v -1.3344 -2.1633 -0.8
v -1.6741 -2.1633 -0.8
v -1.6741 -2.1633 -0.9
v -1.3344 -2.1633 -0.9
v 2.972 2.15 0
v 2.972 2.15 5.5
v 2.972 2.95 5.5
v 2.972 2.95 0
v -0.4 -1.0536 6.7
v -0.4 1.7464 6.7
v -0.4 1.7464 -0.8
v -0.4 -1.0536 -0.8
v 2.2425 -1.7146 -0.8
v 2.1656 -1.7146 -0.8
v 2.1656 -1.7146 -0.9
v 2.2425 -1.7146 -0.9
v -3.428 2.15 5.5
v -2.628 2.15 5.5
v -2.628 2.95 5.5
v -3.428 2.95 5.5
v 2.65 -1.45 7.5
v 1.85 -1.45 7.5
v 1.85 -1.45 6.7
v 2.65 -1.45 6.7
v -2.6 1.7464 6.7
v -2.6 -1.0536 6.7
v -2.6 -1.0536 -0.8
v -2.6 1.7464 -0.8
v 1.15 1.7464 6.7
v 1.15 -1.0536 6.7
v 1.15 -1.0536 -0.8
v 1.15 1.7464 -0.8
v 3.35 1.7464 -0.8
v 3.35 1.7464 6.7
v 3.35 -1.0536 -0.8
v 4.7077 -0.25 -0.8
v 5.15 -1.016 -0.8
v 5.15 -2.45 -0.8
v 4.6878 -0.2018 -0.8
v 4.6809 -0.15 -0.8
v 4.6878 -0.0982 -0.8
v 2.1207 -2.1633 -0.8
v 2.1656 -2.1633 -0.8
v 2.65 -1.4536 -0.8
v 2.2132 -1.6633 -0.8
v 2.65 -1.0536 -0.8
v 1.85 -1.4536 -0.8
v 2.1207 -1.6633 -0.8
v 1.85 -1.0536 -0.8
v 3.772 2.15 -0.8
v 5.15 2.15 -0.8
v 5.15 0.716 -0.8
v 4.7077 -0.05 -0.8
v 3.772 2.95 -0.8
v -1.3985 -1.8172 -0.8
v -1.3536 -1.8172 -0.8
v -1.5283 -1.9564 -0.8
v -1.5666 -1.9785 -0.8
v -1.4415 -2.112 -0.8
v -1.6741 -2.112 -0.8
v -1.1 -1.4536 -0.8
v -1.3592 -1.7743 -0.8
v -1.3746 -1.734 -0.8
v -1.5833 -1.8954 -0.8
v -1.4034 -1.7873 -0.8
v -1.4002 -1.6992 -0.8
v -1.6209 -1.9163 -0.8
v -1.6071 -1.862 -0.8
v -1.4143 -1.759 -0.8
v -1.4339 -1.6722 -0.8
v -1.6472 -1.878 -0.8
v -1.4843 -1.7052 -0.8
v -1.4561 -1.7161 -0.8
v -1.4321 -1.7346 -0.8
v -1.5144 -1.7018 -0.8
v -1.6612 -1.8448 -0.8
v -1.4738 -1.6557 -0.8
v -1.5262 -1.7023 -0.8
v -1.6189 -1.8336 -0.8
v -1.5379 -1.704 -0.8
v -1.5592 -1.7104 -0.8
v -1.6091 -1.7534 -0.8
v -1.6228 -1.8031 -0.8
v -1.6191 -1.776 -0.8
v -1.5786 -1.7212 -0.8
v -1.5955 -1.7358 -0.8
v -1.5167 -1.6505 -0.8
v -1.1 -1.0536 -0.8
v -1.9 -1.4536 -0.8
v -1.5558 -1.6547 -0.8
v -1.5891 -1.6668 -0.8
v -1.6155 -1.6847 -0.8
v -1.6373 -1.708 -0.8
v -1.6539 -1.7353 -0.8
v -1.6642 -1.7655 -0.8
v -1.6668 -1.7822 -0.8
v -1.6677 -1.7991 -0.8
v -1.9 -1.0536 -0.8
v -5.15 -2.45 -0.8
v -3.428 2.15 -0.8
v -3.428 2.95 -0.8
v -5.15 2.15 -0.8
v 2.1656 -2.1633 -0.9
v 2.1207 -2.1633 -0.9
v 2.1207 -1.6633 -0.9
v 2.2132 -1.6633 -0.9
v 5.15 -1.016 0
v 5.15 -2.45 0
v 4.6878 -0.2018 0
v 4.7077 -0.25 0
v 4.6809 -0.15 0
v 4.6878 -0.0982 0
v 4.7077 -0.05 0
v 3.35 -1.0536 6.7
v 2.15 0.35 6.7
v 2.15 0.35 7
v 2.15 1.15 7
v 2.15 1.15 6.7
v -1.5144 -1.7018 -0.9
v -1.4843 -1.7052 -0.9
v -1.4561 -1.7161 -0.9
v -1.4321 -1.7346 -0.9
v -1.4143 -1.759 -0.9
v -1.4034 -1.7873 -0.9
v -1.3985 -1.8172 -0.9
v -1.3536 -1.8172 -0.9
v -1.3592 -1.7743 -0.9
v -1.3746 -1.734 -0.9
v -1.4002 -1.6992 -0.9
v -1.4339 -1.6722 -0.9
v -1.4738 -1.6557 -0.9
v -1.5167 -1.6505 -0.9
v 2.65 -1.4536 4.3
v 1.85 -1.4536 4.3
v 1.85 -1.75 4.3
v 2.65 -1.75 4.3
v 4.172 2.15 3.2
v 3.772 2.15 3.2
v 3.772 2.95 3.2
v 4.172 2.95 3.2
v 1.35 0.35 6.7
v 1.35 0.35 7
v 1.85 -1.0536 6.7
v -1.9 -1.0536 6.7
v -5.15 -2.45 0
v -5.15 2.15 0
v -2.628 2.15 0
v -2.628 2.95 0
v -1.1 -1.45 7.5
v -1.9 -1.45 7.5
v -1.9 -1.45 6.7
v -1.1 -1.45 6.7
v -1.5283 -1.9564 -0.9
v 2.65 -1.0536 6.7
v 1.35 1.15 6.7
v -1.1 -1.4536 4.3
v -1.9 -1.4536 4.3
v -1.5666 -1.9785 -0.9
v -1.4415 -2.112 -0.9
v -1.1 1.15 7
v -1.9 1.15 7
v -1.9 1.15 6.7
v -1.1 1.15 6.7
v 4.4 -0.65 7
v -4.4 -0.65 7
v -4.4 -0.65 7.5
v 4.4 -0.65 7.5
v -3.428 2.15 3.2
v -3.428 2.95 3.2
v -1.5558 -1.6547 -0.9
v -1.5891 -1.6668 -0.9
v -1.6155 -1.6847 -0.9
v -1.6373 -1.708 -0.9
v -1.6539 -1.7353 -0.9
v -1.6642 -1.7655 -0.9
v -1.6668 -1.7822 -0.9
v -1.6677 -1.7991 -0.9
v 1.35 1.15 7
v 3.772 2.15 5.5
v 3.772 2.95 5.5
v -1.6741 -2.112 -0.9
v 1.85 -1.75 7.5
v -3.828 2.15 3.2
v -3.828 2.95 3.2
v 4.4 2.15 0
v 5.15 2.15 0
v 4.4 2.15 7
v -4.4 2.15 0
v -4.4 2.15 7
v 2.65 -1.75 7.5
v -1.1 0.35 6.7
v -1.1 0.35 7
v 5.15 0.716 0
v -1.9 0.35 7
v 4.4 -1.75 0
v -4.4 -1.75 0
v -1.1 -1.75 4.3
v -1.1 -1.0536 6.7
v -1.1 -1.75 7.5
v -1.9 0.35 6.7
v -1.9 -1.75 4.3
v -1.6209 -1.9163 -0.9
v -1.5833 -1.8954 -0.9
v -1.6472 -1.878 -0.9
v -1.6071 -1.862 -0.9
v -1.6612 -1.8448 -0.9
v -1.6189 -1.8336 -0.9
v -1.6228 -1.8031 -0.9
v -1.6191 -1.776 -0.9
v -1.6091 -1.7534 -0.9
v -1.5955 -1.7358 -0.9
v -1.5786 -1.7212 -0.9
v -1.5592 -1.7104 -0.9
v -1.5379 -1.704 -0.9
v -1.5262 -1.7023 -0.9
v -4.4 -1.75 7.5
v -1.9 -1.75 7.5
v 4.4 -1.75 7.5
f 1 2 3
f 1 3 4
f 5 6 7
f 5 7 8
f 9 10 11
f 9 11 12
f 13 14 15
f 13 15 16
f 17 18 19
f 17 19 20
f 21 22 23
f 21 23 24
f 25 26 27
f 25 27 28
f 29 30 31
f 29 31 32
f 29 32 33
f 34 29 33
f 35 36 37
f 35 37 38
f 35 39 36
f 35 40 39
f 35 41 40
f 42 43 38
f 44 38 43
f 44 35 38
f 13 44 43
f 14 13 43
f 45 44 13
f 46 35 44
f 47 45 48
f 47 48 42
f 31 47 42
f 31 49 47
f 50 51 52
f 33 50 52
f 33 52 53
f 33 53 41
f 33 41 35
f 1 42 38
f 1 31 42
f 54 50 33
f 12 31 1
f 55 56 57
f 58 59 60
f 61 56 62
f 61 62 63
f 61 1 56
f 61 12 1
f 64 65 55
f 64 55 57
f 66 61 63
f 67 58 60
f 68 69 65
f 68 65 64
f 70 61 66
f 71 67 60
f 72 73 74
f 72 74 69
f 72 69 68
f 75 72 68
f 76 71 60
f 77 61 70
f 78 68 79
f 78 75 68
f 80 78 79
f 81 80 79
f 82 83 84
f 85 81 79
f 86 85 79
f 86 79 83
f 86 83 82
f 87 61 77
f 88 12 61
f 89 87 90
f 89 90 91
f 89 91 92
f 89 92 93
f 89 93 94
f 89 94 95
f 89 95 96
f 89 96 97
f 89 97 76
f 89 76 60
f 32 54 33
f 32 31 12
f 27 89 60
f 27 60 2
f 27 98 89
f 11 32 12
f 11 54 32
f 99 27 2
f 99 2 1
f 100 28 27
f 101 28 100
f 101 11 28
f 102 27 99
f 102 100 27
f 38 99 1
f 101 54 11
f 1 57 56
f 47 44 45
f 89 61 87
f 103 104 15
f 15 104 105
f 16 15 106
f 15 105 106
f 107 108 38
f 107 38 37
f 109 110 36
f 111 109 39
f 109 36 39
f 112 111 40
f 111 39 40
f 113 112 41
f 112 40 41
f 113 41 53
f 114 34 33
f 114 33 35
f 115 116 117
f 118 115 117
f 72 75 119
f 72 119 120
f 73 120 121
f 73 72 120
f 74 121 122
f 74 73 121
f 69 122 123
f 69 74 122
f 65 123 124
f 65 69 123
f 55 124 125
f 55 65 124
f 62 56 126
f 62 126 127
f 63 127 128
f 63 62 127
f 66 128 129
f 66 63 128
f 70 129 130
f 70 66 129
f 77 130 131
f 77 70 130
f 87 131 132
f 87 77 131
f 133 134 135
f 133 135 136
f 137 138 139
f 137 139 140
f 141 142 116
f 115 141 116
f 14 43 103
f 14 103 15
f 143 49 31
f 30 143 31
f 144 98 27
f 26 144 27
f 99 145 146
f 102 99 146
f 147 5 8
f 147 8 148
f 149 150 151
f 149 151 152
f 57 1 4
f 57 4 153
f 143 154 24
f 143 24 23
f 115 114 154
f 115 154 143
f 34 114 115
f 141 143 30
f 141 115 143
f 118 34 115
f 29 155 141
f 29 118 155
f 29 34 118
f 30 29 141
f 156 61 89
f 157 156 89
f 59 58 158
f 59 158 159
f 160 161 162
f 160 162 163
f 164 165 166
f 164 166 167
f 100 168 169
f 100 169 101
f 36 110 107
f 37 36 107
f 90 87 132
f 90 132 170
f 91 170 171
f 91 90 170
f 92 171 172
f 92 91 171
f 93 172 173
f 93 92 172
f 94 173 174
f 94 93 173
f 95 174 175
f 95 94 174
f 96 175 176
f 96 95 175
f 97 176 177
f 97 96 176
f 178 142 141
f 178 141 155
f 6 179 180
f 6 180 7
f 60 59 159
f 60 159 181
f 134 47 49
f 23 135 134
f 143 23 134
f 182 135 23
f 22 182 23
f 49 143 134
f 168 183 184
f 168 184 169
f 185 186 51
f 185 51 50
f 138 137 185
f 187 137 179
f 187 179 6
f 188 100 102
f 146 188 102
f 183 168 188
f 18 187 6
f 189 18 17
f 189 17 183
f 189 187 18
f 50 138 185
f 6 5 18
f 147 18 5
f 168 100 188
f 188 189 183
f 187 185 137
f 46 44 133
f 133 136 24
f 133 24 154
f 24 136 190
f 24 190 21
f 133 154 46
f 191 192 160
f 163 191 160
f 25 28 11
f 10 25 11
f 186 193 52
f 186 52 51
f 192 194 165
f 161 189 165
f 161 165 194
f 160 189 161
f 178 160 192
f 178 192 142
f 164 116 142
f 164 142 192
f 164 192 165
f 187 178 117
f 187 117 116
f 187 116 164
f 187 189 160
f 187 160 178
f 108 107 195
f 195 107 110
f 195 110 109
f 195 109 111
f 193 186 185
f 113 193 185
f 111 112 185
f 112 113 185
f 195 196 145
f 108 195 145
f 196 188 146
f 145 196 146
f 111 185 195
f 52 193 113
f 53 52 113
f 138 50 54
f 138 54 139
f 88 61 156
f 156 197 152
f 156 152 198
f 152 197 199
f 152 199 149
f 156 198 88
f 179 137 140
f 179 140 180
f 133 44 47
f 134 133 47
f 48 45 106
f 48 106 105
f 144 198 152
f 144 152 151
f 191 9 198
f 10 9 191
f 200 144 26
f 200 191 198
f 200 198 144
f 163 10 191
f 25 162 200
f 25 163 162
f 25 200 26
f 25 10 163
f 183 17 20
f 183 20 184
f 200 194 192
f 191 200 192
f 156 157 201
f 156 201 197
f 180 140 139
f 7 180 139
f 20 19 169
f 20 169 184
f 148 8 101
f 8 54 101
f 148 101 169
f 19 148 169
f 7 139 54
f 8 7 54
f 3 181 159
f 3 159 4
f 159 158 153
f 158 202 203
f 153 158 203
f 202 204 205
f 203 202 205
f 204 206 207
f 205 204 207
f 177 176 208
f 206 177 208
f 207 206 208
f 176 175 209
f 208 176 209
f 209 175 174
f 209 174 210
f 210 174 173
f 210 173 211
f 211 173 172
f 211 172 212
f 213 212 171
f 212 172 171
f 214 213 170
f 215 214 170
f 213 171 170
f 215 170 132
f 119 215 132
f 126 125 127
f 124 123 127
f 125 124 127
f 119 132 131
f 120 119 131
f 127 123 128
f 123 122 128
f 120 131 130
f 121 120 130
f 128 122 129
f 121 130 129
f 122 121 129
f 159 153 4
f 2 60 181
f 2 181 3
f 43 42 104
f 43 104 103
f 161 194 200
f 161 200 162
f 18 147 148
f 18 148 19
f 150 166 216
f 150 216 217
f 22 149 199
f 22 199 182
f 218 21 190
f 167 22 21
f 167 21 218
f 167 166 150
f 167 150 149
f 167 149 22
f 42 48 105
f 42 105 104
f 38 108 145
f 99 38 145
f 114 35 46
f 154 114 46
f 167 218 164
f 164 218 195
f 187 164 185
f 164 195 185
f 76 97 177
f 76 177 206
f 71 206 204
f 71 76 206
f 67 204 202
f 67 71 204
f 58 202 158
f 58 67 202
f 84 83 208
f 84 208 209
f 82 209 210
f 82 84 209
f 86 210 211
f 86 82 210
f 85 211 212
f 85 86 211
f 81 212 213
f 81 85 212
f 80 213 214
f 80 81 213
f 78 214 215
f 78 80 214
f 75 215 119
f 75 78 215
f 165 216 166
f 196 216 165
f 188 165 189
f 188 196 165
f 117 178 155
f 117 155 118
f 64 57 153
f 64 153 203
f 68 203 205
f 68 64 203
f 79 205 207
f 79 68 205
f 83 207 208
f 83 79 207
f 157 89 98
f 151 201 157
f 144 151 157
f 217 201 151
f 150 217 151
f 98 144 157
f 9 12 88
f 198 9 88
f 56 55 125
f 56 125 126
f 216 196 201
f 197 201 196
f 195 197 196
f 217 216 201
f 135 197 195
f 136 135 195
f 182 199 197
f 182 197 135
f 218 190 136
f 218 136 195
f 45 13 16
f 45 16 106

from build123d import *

# Parameters (mm, degrees)
SKETCH1_W           = 8.8
SKETCH1_H           = 4.3
BOSS_EXTRUDE1_DEPTH = 7
SKETCH2_W           = 10.3
SKETCH2_H           = 4.6
BOSS_EXTRUDE2_DEPTH = 0.8
CUT_EXTRUDE1_DEPTH  = 1
FILLET1_R           = 0.2
SKETCH4_W           = 8.8
SKETCH4_H           = 1.5
BOSS_EXTRUDE3_DEPTH = 0.5
SKETCH5_W           = 0.8
SKETCH5_H           = 0.7
CUT_EXTRUDE2_DEPTH  = 3.2
SKETCH6_W           = 0.8
SKETCH6_H           = 0.8
CUT_EXTRUDE3_DEPTH  = 10
BOSS_EXTRUDE4_DEPTH = 0.8
CUT_EXTRUDE4_DEPTH  = 7.5
CUT_EXTRUDE5_DEPTH  = 0.4
BOSS_EXTRUDE5_DEPTH = 0.1


with BuildPart() as part:
    # Sketch1 → Boss-Extrude1 (new body)
    with BuildSketch(Plane.XY):
        Rectangle(SKETCH1_W, SKETCH1_H)
    extrude(amount=BOSS_EXTRUDE1_DEPTH)

    # Sketch2 → Boss-Extrude2 (add)
    with BuildSketch(Plane(origin=(0, 0, 0), x_dir=(-1, 0, 0), z_dir=(0, 0, -1))):
        with Locations((0, -0.15)):
            Rectangle(SKETCH2_W, SKETCH2_H)
    extrude(amount=BOSS_EXTRUDE2_DEPTH)

    # Sketch3 → Cut-Extrude1 (cut)
    with BuildSketch(Plane.XY):
        Polygon((4.65, -0.15), (5.15, -1.016025404), (5.15, 0.716025404), align=None)
    extrude(amount=-CUT_EXTRUDE1_DEPTH, mode=Mode.SUBTRACT)

    # Fillet1
    fillet1_edges = [part.edges().sort_by_distance(p)[0] for p in [
        (4.65, -0.15, -0.4),
    ]]
    fillet(fillet1_edges, radius=FILLET1_R)

    # Sketch4 → Boss-Extrude3 (add)
    with BuildSketch(Plane.XY.offset(7)):
        with Locations((0, -1.4)):
            Rectangle(SKETCH4_W, SKETCH4_H)
    extrude(amount=BOSS_EXTRUDE3_DEPTH)

    # Sketch5 → Cut-Extrude2 (cut)
    with BuildSketch(Plane.XY.offset(7.5)):
        with Locations((-1.5, -1.8)):
            Rectangle(SKETCH5_W, SKETCH5_H)
        with Locations((2.25, -1.8)):
            Rectangle(SKETCH5_W, SKETCH5_H)
    extrude(amount=-CUT_EXTRUDE2_DEPTH, mode=Mode.SUBTRACT)

    # Sketch6 → Cut-Extrude3 (cut)
    with BuildSketch(Plane.XY.offset(7)):
        with Locations((-1.5, 0.75)):
            Rectangle(SKETCH6_W, SKETCH6_H)
        with Locations((1.75, 0.75)):
            Rectangle(SKETCH6_W, SKETCH6_H)
    extrude(amount=-CUT_EXTRUDE3_DEPTH, mode=Mode.SUBTRACT)

    # Sketch7 → Boss-Extrude4 (add)
    with BuildSketch(Plane(origin=(0, 2.15, 0), x_dir=(1, 0, 0), z_dir=(0, 1, 0))):
        Polygon((-3.427970594, -5.5), (-3.827970594, -3.2), (-3.427970594, -3.2), (-3.427970594, 0.8), (3.772029406, 0.8), (3.772029406, -3.2), (4.172029406, -3.2), (3.772029406, -5.5), (2.972029406, -5.5), (2.972029406, 0), (-2.627970594, 0), (-2.627970594, -5.5), align=None)
    extrude(amount=BOSS_EXTRUDE4_DEPTH)

    # Sketch8 → Cut-Extrude4 (cut)
    with BuildSketch(Plane(origin=(0, 0, -0.8), x_dir=(-1, 0, 0), z_dir=(0, 0, -1))):
        Polygon((2.6, 1.746369259), (0.4, 1.746369259), (0.4, -1.053630741), (1.1, -1.053630741), (1.1, -1.453630741), (1.9, -1.453630741), (1.9, -1.053630741), (2.6, -1.053630741), align=None)
        Polygon((-1.15, 1.746369259), (-3.35, 1.746369259), (-3.35, -1.053630741), (-2.65, -1.053630741), (-2.65, -1.453630741), (-1.85, -1.453630741), (-1.85, -1.053630741), (-1.15, -1.053630741), align=None)
    extrude(amount=-CUT_EXTRUDE4_DEPTH, mode=Mode.SUBTRACT)

    # Sketch9 → Cut-Extrude5 (cut)
    with BuildSketch(Plane.XZ.offset(2.15)):
        Polygon((2.65, 7.5), (2.65, 4.3), (1.85, 4.3), (1.85, 7.5), (-1.1, 7.5), (-1.1, 4.3), (-1.9, 4.3), (-1.9, 7.5), (-4.4, 7.5), (-4.4, 0), (4.4, 0), (4.4, 7.5), align=None)
    extrude(amount=-CUT_EXTRUDE5_DEPTH, mode=Mode.SUBTRACT)

    # Sketch10 → Boss-Extrude5 (add)
    with BuildSketch(Plane(origin=(0, 0, -0.8), x_dir=(-1, 0, 0), z_dir=(0, 0, -1))):
        Polygon((-2.213189244, -1.663325944), (-2.120741327, -1.663325944), (-2.120741327, -2.163325944), (-2.165613122, -2.163325944), (-2.165613122, -1.714607995), (-2.242536199, -1.714607995), align=None)
        with BuildLine():
            Line((1.398489442, -1.817172097), (1.353617647, -1.817172097))
            add(Edge.make_bspline(
                [(1.353617647, -1.817172097), (1.353910097, -1.811219114), (1.354484462, -1.799527611), (1.357174218, -1.782481339), (1.361022915, -1.766187796), (1.366464551, -1.750777809), (1.373222591, -1.736115122), (1.38132688, -1.722257977), (1.390926002, -1.709259236), (1.401812678, -1.697239401), (1.413636769, -1.686212605), (1.426394761, -1.676690427), (1.439801193, -1.668645046), (1.453815393, -1.661919154), (1.468595473, -1.656870605), (1.48400731, -1.653124656), (1.500118616, -1.650870893), (1.511095762, -1.650628637), (1.516678544, -1.650505431)],
                knots=[0, 0, 0, 0, 1.7869e-05, 3.5094e-05, 5.1686e-05, 6.8032e-05, 8.4031e-05, 0.000100058, 0.000116104, 0.000132416, 0.000148647, 0.000164532, 0.000180078, 0.00019549, 0.000211074, 0.000226841, 0.000243017, 0.000259759, 0.000259759, 0.000259759, 0.000259759], degree=3))
            add(Edge.make_bspline(
                [(1.516678544, -1.650505431), (1.522161126, -1.650633782), (1.532934204, -1.650885987), (1.548657349, -1.653051848), (1.563625534, -1.656444075), (1.577809501, -1.661203421), (1.591096081, -1.667601196), (1.603585088, -1.675286559), (1.615425204, -1.684175106), (1.626083316, -1.694639936), (1.635870184, -1.705811706), (1.644313363, -1.717738549), (1.651543815, -1.730057018), (1.657570627, -1.742861047), (1.662007218, -1.756271194), (1.665375533, -1.770092223), (1.66727945, -1.784467196), (1.667571653, -1.794196704), (1.667720211, -1.799143251)],
                knots=[0, 0, 0, 0, 1.6441e-05, 3.2306e-05, 4.7516e-05, 6.2435e-05, 7.7085e-05, 9.1652e-05, 0.000106376, 0.000121393, 0.000136374, 0.000150882, 0.000165157, 0.000179183, 0.000193247, 0.000207458, 0.000221808, 0.000236648, 0.000236648, 0.000236648, 0.000236648], degree=3))
            add(Edge.make_bspline(
                [(1.667720211, -1.799143251), (1.667478316, -1.806107228), (1.666998772, -1.819912973), (1.662896718, -1.84020081), (1.656490074, -1.859857013), (1.648776166, -1.875676627), (1.640994388, -1.888424269), (1.633981887, -1.898919799), (1.625772628, -1.91022058), (1.616247128, -1.922288771), (1.605602432, -1.9352189), (1.593742123, -1.949003157), (1.580581626, -1.963499124), (1.571344697, -1.973399924), (1.566558352, -1.978530271)],
                knots=[0, 0, 0, 0, 2.0874e-05, 4.1382e-05, 6.1843e-05, 8.2763e-05, 9.3997e-05, 0.000106637, 0.000120621, 0.000135888, 0.000152753, 0.000170863, 0.000190435, 0.000211484, 0.000211484, 0.000211484, 0.000211484], degree=3))
            Line((1.566558352, -1.978530271), (1.441458192, -2.112043892))
            Line((1.441458192, -2.112043892), (1.674130467, -2.112043892))
            Line((1.674130467, -2.112043892), (1.674130467, -2.163325944))
            Line((1.674130467, -2.163325944), (1.334386878, -2.163325944))
            Line((1.334386878, -2.163325944), (1.528297134, -1.956394854))
            add(Edge.make_bspline(
                [(1.528297134, -1.956394854), (1.533018261, -1.951466524), (1.542086579, -1.942000212), (1.554912661, -1.928179789), (1.566432517, -1.915358426), (1.576720716, -1.903560348), (1.585554074, -1.892612981), (1.593392964, -1.88287088), (1.599673763, -1.873905959), (1.606490248, -1.863514443), (1.613092245, -1.850826969), (1.618765439, -1.835322156), (1.622224703, -1.81936112), (1.622639679, -1.808575115), (1.622848416, -1.803149662)],
                knots=[0, 0, 0, 0, 2.0474e-05, 3.9327e-05, 5.6561e-05, 7.2184e-05, 8.6278e-05, 9.8762e-05, 0.000109683, 0.000119101, 0.000136035, 0.000152448, 0.000168517, 0.00018478, 0.00018478, 0.00018478, 0.00018478], degree=3))
            add(Edge.make_bspline(
                [(1.622848416, -1.803149662), (1.622757596, -1.799738033), (1.622578606, -1.793014369), (1.620998935, -1.783156403), (1.61861172, -1.773647144), (1.615190969, -1.764457341), (1.61067572, -1.755679391), (1.605179523, -1.747302608), (1.598838086, -1.739204185), (1.59150219, -1.731610856), (1.583443402, -1.724656398), (1.574929937, -1.718495815), (1.56592278, -1.71334737), (1.556459905, -1.709126871), (1.546567695, -1.705816102), (1.536227017, -1.703522019), (1.525466443, -1.702081664), (1.518118801, -1.701886783), (1.514374859, -1.701787482)],
                knots=[0, 0, 0, 0, 1.0229e-05, 2.0159e-05, 2.9876e-05, 3.9606e-05, 4.9505e-05, 5.9423e-05, 6.9622e-05, 8.0319e-05, 9.1042e-05, 0.000101521, 0.000111795, 0.000122107, 0.000132559, 0.000143032, 0.000153841, 0.00016507, 0.00016507, 0.00016507, 0.00016507], degree=3))
            add(Edge.make_bspline(
                [(1.514374859, -1.701787482), (1.51046474, -1.70188963), (1.502785912, -1.70209023), (1.491511764, -1.703493468), (1.480756653, -1.705914302), (1.470493524, -1.709225256), (1.460705012, -1.71343362), (1.45143872, -1.718675298), (1.44271545, -1.724930083), (1.434518804, -1.732021591), (1.426966807, -1.739916962), (1.420331539, -1.748718385), (1.414533822, -1.758265159), (1.40947536, -1.768531523), (1.405367405, -1.779610635), (1.402228383, -1.791463164), (1.399744548, -1.804037647), (1.398914759, -1.812721231), (1.398489442, -1.817172097)],
                knots=[0, 0, 0, 0, 1.1729e-05, 2.3035e-05, 3.4018e-05, 4.4756e-05, 5.5343e-05, 6.5928e-05, 7.6628e-05, 8.7492e-05, 9.8403e-05, 0.00010934, 0.000120489, 0.000131867, 0.000143625, 0.00015587, 0.000168619, 0.000182025, 0.000182025, 0.000182025, 0.000182025], degree=3))
        make_face()
    extrude(amount=BOSS_EXTRUDE5_DEPTH)


solid = part.part
